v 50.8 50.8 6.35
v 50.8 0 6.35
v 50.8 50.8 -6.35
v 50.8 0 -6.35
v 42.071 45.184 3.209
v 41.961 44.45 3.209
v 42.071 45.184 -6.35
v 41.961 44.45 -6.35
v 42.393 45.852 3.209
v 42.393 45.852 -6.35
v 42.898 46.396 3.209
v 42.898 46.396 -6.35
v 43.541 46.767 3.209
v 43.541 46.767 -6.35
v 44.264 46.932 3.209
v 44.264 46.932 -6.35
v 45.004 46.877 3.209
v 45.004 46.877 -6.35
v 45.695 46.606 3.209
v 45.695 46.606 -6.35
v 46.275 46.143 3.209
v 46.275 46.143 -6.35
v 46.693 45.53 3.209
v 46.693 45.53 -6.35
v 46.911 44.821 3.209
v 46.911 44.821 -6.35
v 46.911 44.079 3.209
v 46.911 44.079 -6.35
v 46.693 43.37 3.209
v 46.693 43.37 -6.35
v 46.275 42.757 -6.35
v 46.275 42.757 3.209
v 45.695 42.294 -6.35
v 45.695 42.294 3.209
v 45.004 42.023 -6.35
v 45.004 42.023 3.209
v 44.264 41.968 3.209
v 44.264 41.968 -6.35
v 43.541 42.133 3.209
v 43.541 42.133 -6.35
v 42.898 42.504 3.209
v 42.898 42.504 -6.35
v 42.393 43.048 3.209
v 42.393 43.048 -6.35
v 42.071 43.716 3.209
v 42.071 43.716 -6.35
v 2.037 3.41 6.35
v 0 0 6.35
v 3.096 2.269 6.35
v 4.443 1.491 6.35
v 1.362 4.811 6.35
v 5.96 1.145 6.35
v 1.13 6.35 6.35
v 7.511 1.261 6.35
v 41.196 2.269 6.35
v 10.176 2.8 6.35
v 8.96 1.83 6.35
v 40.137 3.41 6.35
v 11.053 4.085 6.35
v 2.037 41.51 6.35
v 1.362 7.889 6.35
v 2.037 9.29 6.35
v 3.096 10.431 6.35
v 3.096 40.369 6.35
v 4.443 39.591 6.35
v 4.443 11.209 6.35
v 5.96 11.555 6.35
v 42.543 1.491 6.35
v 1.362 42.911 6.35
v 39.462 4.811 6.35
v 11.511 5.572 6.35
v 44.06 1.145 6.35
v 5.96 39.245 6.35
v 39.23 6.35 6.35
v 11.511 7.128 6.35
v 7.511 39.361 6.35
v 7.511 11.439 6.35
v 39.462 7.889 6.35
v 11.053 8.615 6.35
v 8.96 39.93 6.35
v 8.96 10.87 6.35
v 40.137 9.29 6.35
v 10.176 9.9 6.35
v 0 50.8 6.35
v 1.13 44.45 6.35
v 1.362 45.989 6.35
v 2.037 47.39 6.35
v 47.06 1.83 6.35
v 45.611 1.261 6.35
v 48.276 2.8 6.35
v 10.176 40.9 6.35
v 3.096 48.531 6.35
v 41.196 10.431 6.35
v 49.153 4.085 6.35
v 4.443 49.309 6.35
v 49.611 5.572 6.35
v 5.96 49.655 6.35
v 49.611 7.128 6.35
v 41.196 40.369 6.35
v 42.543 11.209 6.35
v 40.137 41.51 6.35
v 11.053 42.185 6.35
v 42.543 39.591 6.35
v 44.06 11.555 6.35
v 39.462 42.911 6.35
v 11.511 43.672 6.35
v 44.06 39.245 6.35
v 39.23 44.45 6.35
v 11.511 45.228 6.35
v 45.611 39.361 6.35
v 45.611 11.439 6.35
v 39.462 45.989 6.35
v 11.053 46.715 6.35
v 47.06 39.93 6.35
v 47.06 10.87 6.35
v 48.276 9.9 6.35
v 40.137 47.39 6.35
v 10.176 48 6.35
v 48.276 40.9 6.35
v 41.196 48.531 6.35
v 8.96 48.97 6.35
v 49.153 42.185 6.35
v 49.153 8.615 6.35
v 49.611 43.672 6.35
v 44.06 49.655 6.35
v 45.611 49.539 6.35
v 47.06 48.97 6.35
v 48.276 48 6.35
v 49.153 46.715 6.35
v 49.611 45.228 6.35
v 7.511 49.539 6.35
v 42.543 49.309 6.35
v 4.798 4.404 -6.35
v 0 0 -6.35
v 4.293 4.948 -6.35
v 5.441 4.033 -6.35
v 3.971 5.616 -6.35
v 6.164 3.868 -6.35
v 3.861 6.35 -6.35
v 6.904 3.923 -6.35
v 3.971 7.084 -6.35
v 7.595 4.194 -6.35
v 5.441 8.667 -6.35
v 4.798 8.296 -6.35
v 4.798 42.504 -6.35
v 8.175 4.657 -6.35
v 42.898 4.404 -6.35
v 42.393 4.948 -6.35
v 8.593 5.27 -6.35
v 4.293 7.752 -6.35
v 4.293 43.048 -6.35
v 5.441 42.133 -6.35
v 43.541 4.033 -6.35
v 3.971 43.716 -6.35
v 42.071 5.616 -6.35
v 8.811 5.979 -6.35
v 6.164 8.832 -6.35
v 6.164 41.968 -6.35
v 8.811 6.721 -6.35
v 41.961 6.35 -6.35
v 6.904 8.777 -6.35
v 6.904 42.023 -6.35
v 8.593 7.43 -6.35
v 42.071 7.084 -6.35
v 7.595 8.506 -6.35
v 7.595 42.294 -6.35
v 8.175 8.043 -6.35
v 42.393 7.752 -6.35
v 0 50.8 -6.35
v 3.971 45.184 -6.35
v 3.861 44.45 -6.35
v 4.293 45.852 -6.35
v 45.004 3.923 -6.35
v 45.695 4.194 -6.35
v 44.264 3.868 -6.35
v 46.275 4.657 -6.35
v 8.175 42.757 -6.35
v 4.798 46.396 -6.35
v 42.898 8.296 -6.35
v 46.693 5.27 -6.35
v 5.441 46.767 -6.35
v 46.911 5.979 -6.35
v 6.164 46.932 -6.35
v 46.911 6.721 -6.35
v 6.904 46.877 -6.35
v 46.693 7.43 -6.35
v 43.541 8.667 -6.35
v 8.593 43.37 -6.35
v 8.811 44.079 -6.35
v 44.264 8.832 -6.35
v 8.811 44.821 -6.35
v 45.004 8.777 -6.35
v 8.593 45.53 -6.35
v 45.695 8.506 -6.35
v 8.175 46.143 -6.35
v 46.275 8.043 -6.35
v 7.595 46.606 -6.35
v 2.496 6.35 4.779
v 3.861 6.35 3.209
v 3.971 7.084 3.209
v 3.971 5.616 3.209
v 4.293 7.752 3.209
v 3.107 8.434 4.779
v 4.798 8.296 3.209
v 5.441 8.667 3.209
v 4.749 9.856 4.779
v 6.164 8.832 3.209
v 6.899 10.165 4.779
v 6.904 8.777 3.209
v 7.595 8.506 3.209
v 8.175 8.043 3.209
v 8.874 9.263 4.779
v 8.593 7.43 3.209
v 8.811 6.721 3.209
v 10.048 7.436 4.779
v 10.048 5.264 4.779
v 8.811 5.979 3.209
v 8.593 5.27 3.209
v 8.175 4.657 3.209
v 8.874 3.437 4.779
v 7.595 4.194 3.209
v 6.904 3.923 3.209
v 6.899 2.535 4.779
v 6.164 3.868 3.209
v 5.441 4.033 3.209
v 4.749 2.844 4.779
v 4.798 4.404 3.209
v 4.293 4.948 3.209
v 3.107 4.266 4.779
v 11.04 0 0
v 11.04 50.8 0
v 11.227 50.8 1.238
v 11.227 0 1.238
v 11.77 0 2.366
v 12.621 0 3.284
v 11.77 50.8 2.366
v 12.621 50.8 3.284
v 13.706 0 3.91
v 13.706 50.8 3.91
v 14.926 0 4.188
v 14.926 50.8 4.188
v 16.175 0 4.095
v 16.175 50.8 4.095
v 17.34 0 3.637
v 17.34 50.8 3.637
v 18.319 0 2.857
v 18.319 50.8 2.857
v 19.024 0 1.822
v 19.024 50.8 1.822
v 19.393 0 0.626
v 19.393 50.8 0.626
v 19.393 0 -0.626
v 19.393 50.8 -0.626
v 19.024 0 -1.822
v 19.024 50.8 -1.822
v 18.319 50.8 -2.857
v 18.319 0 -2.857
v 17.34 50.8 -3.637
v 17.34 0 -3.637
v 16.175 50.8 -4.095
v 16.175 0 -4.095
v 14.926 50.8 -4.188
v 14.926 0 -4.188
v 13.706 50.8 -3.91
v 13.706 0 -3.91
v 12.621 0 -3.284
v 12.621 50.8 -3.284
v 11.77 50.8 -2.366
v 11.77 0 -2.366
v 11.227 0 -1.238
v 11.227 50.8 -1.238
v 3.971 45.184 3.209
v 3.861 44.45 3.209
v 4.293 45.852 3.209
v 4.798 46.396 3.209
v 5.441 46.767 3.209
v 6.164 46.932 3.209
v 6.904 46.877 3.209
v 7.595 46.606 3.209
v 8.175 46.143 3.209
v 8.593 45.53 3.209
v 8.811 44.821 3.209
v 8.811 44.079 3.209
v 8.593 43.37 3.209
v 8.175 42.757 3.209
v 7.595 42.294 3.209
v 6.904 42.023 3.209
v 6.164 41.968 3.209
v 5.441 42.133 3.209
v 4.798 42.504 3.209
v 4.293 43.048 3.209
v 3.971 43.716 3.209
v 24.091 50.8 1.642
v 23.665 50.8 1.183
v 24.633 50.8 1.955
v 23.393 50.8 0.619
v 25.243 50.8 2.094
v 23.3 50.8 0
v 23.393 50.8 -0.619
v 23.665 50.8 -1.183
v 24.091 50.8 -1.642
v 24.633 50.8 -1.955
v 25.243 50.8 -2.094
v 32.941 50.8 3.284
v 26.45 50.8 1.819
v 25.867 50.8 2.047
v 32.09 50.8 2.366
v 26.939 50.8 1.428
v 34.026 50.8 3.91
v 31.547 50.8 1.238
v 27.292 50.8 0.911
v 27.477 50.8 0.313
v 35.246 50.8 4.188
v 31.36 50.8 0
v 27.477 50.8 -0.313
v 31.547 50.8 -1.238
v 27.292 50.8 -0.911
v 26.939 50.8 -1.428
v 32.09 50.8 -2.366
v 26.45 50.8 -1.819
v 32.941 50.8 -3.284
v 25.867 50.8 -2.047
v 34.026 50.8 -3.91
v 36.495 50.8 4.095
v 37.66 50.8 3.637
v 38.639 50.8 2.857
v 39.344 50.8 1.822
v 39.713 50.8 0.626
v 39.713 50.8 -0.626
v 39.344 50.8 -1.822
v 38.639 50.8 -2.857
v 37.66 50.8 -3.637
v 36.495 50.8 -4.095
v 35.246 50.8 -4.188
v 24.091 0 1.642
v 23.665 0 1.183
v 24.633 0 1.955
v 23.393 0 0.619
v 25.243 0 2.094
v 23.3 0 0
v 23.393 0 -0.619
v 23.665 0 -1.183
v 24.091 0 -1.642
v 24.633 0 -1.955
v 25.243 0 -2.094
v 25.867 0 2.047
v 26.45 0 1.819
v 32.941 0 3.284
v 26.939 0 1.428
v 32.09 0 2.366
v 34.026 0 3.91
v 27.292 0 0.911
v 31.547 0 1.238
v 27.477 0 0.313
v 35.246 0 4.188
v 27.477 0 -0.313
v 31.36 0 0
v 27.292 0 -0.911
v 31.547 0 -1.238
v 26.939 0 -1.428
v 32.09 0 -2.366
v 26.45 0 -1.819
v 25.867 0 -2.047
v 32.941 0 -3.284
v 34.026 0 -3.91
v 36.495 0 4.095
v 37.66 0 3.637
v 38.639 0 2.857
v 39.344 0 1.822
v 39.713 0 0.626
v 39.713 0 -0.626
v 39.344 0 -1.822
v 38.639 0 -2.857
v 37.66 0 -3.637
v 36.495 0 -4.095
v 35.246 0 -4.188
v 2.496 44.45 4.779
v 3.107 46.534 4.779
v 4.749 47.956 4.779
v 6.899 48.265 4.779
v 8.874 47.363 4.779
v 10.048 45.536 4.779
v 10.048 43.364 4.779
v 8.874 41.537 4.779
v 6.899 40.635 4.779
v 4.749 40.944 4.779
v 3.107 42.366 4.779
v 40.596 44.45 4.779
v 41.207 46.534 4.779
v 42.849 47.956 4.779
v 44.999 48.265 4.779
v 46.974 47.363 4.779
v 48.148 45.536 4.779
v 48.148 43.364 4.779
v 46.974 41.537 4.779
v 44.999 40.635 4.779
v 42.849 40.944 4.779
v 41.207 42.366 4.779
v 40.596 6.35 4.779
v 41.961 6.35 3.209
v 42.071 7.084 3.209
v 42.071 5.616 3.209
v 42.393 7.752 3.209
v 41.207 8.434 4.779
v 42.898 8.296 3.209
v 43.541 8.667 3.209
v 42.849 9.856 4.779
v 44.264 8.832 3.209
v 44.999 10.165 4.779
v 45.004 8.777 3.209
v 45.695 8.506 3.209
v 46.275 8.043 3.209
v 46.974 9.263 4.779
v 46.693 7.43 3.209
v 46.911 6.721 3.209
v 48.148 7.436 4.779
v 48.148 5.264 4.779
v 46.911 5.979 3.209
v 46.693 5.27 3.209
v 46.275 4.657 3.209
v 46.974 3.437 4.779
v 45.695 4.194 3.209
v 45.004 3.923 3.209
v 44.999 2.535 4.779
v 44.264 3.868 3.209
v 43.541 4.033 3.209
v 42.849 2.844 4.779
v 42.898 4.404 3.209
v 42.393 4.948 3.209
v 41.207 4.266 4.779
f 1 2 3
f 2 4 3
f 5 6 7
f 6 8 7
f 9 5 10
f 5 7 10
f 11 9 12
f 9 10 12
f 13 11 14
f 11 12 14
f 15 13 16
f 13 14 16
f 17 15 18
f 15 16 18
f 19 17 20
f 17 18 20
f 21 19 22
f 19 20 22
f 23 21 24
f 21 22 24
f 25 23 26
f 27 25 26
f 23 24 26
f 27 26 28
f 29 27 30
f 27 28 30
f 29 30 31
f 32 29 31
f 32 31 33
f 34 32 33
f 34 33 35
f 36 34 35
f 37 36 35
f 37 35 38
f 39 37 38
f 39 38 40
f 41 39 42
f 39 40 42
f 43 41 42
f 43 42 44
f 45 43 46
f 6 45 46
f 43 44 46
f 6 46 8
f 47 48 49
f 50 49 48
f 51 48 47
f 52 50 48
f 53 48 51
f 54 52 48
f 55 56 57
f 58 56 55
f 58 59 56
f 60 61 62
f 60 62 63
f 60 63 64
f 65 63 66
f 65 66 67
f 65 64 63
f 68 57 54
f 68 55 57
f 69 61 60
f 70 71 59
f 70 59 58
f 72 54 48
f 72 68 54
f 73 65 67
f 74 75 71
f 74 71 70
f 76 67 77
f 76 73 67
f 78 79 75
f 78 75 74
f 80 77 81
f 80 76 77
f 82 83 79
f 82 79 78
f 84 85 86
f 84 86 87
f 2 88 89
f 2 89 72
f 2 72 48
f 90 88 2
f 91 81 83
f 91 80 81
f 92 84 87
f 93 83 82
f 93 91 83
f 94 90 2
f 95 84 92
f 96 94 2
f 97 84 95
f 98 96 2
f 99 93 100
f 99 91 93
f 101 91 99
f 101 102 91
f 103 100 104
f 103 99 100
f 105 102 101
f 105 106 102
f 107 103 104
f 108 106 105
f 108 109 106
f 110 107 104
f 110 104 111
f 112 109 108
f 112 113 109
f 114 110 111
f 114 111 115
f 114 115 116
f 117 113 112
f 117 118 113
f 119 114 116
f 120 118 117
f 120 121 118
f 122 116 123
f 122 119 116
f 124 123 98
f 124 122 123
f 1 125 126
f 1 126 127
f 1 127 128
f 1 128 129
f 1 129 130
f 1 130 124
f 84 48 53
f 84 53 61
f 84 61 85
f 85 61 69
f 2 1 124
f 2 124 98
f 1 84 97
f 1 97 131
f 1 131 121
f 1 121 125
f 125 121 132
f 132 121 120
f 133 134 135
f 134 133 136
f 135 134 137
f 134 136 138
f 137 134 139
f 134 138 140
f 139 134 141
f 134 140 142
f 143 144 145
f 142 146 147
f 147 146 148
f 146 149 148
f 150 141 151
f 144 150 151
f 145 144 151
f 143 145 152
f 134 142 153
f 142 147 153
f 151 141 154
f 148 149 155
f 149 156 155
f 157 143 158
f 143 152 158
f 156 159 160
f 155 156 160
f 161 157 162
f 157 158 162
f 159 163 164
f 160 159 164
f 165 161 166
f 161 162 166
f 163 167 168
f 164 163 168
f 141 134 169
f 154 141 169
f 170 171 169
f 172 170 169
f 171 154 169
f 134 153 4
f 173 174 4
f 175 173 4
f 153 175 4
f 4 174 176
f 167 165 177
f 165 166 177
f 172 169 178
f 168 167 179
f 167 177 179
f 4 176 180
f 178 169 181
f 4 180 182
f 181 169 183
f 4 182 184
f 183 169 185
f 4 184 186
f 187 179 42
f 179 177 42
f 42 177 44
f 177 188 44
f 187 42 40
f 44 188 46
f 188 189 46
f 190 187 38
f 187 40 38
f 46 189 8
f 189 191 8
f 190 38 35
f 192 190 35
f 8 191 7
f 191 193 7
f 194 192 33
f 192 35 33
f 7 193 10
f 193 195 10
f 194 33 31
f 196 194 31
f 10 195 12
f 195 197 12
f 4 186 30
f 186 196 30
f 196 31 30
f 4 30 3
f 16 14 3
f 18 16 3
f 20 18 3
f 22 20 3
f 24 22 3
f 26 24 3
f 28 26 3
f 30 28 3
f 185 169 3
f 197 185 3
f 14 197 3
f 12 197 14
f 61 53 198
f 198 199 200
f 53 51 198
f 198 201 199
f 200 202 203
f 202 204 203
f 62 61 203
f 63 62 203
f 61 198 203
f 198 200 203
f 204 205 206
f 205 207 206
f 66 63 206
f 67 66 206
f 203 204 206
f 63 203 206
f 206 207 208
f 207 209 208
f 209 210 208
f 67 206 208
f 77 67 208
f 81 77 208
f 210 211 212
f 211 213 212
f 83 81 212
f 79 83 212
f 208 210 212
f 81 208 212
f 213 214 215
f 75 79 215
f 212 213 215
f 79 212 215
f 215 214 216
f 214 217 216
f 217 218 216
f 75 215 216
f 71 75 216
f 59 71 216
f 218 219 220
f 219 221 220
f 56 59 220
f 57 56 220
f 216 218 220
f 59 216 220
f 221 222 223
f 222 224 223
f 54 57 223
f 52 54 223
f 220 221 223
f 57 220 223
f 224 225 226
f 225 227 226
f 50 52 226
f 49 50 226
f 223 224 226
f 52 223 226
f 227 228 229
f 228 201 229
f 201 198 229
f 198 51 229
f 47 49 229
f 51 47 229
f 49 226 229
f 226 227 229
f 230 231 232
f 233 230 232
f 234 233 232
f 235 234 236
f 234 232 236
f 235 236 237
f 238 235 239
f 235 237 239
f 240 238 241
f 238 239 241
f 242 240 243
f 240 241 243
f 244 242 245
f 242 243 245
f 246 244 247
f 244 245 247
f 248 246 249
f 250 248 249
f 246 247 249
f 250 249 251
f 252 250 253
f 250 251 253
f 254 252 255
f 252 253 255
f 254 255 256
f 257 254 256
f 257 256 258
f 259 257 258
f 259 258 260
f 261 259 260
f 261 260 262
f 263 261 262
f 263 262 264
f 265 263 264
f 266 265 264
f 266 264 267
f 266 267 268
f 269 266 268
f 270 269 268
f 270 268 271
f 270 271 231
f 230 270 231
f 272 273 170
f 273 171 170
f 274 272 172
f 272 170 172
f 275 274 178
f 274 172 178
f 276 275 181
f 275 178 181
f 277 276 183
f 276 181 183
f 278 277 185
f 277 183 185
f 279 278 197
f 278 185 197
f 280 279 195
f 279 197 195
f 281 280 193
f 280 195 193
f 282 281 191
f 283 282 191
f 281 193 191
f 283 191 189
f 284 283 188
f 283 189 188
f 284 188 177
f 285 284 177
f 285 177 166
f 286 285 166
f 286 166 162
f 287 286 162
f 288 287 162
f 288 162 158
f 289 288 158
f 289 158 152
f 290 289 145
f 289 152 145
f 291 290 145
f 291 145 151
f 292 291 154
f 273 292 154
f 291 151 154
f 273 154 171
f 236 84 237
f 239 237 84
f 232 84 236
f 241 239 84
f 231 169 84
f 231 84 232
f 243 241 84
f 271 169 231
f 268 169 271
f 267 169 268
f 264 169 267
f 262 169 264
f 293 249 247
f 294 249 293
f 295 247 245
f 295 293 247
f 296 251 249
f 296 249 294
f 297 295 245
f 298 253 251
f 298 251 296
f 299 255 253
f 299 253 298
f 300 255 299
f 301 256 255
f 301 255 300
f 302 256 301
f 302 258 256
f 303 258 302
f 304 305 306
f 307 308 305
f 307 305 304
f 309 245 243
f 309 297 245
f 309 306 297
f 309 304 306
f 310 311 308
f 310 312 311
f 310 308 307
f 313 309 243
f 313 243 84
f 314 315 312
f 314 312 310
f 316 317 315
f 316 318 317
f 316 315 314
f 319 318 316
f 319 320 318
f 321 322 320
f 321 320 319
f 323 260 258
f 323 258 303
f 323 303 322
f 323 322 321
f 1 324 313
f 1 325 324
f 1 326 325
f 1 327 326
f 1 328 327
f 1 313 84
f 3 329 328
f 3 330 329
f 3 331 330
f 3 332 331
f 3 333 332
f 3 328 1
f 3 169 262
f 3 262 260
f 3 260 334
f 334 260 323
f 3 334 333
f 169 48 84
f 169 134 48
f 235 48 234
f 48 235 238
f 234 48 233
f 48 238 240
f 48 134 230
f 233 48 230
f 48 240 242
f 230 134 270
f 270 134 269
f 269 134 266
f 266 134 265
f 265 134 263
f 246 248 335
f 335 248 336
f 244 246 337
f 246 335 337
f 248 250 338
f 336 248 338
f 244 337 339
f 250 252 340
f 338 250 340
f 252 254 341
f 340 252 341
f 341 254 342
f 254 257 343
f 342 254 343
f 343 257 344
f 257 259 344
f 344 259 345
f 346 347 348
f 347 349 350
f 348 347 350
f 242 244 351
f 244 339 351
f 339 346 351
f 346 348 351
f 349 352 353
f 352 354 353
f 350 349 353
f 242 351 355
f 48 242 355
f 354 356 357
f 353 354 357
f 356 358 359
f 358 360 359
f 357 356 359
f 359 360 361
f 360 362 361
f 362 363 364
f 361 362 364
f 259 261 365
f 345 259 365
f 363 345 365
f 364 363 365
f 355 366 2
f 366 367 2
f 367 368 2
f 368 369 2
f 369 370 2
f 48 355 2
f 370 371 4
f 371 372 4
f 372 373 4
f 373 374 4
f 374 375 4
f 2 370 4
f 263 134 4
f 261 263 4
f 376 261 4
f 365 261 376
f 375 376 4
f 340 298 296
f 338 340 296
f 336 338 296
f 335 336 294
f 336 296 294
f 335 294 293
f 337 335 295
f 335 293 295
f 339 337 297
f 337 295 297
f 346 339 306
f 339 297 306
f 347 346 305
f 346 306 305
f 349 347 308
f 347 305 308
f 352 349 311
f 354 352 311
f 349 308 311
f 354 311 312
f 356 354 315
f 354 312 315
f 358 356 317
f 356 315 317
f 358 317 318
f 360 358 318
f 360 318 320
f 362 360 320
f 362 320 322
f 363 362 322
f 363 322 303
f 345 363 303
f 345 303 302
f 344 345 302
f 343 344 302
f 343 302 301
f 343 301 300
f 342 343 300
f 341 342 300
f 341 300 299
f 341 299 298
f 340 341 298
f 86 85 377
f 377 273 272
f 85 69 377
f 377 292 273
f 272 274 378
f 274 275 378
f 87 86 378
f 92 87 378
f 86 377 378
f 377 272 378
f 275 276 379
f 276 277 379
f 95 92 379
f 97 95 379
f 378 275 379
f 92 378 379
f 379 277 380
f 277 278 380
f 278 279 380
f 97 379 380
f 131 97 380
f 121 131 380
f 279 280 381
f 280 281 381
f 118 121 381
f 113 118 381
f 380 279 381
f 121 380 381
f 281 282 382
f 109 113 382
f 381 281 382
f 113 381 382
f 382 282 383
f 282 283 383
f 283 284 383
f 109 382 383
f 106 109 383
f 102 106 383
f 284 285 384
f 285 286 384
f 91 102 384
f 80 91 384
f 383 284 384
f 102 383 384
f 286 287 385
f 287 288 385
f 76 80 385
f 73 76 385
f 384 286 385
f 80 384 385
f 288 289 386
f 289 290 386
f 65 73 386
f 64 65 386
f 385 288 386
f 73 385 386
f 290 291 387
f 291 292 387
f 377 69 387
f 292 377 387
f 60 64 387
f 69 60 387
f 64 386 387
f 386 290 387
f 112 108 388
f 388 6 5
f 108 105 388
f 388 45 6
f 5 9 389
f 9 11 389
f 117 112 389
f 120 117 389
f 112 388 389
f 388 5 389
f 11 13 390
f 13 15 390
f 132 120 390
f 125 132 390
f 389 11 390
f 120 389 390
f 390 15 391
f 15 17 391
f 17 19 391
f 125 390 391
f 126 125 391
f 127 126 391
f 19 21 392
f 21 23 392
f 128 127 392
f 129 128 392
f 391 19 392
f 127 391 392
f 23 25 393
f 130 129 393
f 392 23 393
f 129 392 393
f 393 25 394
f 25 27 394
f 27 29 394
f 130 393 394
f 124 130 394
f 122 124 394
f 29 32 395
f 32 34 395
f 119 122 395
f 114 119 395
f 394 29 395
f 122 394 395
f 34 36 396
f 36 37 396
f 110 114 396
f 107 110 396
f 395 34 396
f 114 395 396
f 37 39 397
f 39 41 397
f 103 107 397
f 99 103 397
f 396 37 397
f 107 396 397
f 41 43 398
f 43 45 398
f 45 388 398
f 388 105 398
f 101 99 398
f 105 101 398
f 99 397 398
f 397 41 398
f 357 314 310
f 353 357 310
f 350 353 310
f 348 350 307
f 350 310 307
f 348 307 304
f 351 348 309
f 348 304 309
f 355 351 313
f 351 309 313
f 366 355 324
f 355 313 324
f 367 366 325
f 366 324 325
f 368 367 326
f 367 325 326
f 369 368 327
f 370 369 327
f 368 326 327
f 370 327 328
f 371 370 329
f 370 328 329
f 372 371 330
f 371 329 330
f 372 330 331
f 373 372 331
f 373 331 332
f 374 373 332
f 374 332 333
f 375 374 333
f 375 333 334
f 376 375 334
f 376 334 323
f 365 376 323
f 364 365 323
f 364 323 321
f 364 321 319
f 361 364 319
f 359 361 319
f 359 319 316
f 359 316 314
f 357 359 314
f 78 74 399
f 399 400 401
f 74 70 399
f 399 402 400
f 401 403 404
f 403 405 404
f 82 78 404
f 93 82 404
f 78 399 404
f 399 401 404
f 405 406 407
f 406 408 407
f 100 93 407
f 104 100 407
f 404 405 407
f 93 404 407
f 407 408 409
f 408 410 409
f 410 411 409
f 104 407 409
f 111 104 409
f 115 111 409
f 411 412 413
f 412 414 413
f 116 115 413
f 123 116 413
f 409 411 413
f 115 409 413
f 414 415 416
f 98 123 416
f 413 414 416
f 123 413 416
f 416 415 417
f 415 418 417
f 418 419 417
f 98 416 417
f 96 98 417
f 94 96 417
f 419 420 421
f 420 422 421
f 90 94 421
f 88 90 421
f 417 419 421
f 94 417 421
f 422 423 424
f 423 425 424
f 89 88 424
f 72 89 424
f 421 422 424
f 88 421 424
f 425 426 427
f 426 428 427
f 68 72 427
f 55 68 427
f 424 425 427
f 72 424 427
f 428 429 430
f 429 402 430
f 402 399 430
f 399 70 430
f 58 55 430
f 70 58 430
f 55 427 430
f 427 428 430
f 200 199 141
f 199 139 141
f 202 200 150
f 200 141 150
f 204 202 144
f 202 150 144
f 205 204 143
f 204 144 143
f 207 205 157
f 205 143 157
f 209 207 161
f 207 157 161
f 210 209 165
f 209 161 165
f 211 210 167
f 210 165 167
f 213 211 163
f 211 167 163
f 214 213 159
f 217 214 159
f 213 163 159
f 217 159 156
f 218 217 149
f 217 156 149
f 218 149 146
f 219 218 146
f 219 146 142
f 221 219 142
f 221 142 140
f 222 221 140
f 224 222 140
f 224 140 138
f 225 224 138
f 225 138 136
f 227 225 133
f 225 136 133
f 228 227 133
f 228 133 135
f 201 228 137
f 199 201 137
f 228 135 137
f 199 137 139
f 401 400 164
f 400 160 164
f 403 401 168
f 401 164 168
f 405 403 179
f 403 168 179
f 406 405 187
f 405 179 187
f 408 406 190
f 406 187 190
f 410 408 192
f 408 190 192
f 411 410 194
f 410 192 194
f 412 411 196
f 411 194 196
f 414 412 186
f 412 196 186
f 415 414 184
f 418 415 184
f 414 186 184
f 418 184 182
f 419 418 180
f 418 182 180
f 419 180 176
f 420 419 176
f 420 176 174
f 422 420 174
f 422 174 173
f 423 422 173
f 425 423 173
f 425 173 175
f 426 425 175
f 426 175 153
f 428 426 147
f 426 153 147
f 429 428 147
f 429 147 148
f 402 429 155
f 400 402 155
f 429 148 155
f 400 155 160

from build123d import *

# Parameters (mm, degrees)
F0_W           = 50.8
F0_H           = 50.8
F1_DEPTH       = 6.35
F1_DEPTH_BACK  = 6.35
F3_D           = 8.4
F5_D           = 4.9784
F5_CSINK_D     = 10.4394
F5_CSINK_ANGLE = 82
F6_D           = 4.2


with BuildPart() as f1:
    # F0 (on Top) → F1 (new body, two sides)
    with BuildSketch(Plane.XY) as f1_sk:
        with Locations((25.4, 25.4)):
            Rectangle(F0_W, F0_H)
    extrude(amount=-F1_DEPTH)
    extrude(f1_sk.sketch, amount=F1_DEPTH_BACK)

    # F3 (through all)
    with Locations(Plane.XZ):
        with Locations((15.24, 0), (35.56, 0)):
            Hole(F3_D / 2)

    # F5 (through all)
    with Locations(Plane.XY.offset(6.35)):
        with Locations((6.35, 44.45), (6.35, 6.35), (44.45, 6.35), (44.45, 44.45)):
            CounterSinkHole(F5_D / 2, F5_CSINK_D / 2, counter_sink_angle=F5_CSINK_ANGLE)

    # F6 (through all)
    with Locations(Plane.XZ):
        with Locations((25.4, 0)):
            Hole(F6_D / 2)


solid = f1.part
